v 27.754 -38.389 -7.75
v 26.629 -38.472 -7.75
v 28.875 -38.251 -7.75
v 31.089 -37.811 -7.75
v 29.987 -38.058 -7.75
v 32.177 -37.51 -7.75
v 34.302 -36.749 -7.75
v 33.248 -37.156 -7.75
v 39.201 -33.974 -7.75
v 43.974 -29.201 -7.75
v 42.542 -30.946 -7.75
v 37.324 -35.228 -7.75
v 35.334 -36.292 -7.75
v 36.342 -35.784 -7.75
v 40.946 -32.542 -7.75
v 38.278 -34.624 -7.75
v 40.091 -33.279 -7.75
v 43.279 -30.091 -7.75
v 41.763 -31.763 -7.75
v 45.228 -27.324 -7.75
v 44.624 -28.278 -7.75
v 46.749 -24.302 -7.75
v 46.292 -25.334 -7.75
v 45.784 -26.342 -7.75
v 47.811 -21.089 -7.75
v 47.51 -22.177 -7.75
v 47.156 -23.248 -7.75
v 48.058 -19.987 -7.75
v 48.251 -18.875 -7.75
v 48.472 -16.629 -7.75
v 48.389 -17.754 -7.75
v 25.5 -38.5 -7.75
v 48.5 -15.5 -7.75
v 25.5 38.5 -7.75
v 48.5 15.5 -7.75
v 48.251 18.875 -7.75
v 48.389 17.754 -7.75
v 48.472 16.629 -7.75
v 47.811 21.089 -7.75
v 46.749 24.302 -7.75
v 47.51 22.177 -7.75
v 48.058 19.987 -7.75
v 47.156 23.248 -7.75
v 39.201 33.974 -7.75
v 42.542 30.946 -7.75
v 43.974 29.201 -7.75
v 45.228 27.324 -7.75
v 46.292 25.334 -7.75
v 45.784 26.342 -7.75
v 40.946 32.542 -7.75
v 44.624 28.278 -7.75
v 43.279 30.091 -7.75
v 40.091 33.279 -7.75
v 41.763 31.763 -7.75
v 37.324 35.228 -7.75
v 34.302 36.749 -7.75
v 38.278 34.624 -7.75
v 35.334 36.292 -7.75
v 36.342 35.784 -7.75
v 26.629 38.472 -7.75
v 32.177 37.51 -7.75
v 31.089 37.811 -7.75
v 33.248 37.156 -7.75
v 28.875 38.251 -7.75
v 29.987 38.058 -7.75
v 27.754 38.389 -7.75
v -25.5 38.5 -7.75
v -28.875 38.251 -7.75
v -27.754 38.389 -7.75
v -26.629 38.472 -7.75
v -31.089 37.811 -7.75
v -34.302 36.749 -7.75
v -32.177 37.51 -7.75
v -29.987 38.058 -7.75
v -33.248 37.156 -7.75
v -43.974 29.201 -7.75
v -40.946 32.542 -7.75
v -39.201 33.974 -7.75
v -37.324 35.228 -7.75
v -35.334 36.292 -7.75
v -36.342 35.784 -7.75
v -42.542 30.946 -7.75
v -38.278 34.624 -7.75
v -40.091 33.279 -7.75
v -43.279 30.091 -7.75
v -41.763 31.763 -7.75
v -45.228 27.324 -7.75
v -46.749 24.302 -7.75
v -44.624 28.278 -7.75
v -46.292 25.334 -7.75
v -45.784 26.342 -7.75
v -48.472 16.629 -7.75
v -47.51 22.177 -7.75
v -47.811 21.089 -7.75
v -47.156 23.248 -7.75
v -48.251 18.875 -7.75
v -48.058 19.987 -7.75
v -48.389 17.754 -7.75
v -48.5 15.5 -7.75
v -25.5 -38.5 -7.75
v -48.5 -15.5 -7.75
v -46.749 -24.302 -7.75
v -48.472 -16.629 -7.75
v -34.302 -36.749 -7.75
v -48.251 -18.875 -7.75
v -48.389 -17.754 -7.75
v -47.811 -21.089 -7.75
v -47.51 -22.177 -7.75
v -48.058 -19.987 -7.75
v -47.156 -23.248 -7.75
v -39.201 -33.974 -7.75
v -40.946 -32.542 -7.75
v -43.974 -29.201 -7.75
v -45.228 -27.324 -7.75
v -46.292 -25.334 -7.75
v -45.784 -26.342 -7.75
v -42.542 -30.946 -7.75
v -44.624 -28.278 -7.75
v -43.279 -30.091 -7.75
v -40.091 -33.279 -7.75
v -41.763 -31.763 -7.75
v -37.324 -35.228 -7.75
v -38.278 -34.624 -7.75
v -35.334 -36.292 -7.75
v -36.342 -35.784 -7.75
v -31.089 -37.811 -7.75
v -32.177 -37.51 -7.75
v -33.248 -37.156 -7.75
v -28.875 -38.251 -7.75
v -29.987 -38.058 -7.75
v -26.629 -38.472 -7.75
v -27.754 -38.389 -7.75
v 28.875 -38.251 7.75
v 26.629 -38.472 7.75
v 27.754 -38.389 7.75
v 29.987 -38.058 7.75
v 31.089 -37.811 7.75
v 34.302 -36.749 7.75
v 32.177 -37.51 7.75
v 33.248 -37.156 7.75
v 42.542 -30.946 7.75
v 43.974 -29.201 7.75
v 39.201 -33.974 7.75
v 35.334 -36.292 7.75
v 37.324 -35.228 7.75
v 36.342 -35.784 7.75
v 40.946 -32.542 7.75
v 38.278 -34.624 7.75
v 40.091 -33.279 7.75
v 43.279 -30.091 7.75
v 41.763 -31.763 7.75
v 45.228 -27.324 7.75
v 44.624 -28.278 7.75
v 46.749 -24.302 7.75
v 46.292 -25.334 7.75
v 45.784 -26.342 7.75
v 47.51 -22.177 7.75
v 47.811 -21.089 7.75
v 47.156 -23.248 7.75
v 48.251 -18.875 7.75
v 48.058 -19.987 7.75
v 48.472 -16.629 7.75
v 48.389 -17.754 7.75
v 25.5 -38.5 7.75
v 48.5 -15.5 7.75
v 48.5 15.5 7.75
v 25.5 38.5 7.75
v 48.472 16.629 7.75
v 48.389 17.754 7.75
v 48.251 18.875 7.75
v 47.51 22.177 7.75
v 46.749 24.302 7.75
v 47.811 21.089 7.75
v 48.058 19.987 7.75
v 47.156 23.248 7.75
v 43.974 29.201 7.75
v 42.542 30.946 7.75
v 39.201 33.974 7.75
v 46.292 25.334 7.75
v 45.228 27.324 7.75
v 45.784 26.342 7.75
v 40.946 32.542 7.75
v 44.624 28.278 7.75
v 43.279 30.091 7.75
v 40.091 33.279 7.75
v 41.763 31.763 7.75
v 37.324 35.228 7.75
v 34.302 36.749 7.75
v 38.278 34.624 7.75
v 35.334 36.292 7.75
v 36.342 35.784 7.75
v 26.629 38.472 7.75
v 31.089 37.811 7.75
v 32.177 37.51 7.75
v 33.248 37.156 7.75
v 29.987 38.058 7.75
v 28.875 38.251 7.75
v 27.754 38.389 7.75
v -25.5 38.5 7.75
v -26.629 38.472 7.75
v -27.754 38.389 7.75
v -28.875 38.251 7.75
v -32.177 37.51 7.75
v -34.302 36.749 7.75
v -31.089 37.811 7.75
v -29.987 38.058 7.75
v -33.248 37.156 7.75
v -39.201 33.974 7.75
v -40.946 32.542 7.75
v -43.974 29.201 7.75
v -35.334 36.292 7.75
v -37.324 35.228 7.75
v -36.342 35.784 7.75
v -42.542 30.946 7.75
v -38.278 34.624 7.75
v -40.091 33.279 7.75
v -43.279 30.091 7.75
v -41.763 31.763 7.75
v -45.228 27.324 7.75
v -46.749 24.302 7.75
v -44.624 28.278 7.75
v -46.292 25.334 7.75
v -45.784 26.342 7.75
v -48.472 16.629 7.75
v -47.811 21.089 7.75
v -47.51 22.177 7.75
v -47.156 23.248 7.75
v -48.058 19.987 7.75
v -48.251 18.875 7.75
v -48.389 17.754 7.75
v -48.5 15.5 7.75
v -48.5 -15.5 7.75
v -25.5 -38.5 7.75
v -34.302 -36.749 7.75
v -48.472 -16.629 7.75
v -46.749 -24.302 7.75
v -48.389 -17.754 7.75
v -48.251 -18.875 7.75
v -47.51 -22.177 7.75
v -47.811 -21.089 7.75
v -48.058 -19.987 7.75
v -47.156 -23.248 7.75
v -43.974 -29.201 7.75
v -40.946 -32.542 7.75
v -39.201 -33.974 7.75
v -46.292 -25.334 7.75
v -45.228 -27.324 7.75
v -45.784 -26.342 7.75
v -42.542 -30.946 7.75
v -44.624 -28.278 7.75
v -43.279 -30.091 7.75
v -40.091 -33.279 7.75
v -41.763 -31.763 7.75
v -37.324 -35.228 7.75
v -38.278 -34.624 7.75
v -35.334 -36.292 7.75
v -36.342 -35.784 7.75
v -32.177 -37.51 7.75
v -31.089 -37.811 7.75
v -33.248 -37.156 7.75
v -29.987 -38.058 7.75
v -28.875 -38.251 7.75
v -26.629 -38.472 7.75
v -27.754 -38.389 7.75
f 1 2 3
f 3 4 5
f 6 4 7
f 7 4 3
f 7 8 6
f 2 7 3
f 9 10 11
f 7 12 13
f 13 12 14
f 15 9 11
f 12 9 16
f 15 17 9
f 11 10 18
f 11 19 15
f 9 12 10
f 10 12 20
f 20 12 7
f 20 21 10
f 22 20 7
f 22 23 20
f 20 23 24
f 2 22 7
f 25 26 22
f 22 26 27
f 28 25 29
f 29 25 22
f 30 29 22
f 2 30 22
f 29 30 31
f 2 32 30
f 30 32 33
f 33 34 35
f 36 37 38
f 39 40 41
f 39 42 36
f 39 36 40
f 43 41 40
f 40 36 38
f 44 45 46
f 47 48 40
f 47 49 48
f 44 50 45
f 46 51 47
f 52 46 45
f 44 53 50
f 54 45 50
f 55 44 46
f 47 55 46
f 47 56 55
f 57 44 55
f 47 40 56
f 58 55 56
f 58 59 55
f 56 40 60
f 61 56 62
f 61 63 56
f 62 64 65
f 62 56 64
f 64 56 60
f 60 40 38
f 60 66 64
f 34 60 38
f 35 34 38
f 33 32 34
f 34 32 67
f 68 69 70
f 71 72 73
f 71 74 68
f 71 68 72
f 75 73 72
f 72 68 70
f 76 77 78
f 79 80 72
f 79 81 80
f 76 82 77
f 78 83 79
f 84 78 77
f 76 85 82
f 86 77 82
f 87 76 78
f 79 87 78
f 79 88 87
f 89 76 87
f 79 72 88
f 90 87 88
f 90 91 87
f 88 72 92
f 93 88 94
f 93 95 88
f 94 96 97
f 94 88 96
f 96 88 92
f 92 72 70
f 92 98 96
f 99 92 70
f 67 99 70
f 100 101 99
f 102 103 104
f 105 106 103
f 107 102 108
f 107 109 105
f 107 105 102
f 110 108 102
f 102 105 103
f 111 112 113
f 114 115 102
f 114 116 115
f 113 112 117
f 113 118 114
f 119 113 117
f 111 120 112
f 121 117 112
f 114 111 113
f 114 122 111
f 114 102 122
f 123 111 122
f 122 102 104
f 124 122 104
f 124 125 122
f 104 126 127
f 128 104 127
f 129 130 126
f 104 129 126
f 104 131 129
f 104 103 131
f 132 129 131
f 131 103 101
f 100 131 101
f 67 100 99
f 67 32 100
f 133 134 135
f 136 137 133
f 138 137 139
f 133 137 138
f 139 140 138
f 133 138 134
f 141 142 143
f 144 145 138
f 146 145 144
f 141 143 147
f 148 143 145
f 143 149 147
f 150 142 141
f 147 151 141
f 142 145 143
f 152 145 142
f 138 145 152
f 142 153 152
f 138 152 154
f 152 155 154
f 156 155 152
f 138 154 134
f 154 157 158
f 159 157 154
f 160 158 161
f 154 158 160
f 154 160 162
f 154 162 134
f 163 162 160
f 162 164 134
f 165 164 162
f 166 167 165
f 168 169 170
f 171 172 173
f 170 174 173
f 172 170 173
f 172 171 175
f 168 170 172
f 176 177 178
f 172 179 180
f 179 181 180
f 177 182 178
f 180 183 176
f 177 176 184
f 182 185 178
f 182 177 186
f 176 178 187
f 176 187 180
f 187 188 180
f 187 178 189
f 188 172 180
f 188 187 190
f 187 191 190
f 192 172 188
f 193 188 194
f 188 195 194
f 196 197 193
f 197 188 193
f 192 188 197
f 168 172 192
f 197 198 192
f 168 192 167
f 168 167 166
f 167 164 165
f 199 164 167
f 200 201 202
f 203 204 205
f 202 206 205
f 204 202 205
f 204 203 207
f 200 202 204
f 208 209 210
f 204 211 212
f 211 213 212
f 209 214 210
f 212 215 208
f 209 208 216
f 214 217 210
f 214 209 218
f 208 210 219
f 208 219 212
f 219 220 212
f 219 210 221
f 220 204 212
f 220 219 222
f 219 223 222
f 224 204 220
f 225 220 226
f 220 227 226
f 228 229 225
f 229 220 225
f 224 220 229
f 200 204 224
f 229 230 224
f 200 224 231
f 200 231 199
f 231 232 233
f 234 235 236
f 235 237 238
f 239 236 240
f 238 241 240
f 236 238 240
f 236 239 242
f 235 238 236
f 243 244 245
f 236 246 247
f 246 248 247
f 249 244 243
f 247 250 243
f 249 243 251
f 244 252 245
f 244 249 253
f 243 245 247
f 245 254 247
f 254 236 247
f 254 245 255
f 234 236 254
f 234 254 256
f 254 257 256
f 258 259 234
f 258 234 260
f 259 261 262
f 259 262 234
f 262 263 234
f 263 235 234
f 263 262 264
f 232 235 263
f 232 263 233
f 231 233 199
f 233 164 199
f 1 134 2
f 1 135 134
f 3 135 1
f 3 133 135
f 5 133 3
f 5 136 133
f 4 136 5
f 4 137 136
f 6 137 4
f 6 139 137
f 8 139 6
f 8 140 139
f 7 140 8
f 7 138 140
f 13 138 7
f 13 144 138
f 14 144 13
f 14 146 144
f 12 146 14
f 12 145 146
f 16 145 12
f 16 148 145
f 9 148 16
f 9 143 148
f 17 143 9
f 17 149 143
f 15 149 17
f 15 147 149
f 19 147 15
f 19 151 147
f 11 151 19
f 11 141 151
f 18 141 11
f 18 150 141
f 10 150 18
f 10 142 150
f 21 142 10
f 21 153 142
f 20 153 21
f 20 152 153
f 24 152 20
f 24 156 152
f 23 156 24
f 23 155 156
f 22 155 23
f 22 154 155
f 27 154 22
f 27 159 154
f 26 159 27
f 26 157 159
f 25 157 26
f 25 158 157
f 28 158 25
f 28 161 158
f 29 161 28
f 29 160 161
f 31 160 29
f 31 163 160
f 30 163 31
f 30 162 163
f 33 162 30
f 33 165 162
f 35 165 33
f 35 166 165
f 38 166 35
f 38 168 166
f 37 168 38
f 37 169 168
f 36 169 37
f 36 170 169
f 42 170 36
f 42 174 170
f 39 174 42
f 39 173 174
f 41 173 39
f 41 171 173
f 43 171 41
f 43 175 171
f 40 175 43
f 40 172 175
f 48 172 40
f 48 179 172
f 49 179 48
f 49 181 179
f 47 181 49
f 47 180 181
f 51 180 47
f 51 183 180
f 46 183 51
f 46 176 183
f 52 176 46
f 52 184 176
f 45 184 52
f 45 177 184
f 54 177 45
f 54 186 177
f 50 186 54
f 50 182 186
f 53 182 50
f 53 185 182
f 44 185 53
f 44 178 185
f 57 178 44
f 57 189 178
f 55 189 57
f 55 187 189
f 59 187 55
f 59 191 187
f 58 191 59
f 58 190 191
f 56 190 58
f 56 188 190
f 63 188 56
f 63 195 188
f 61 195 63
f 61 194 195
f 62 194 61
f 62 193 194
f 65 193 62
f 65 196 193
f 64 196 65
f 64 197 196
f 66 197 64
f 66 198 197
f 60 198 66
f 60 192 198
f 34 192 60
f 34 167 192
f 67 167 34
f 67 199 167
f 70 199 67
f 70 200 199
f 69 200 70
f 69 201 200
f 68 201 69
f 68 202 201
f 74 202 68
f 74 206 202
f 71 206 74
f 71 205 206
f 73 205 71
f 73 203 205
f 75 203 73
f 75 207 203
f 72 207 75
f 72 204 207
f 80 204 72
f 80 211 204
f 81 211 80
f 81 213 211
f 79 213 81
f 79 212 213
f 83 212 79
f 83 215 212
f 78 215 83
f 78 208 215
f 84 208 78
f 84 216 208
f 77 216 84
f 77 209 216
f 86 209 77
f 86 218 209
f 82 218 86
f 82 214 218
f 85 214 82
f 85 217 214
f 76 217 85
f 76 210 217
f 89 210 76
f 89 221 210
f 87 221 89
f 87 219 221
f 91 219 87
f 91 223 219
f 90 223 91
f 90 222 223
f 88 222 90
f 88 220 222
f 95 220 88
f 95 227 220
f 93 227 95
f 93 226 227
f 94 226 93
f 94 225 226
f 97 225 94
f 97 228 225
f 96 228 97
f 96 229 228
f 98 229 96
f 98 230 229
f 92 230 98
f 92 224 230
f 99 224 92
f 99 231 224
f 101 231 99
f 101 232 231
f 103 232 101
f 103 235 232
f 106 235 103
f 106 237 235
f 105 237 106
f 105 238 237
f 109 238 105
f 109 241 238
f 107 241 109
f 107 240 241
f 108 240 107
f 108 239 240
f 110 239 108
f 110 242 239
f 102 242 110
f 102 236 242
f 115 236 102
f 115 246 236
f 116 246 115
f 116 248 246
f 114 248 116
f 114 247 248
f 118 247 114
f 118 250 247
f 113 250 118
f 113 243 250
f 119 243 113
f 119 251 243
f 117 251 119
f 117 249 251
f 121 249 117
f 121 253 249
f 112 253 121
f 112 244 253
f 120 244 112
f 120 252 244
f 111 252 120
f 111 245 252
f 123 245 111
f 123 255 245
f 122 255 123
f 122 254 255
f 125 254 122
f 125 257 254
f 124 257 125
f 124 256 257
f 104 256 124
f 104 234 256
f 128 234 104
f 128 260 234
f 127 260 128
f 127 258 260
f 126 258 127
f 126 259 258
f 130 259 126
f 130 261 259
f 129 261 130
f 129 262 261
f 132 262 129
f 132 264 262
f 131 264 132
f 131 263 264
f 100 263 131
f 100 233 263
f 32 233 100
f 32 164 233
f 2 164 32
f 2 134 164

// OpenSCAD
// ============================================================
// 奥克斯(AUX)饮水机杯垫 —— 内圈实体版 (独立文件)
// 尺寸 = 环形版内腔尺寸: 97 x 77 x 15.5 mm, 四角圆角 R = 23
// 顶/底保持平面; 可选 45° 倒角 (默认 0)
// 尺寸来源: 外圈 101x81 R25 - 壁厚 2mm -> 97x77 R23
// ============================================================

$fn = 128;

W = 97;         // 长 (X) = 101 - 2*壁厚
D = 77;         // 宽 (Y) = 81  - 2*壁厚
H = 15.5;       // 高 (Z)
R = 23;         // 圆角半径 = 25 - 壁厚

CHAMFER = 0;    // 顶/底棱边倒角尺寸 (0 = 不倒角)
E = 0.02;       // 微小过切, 避免共面

// ------------------------------------------------------------
// 带圆角的矩形截面
// ------------------------------------------------------------
module profile() {
    offset(r = R) offset(r = -R)
        square([W, D], center = true);
}

// 主体: 截面沿 Z 拉伸 -> 竖边带 R23 圆角, 顶/底是平面
module body() {
    linear_extrude(height = H, center = true)
        profile();
}

// ------------------------------------------------------------
// 外沿 45° 倒角楔块 (axis: "X"/"Y" 截面所在侧面; sign: ±1; top: 顶/底)
// 斜边严格通过 (i, 顶面) 与 (f, 顶面-CHAMFER), 保证 45°;
// E 只加在楔块外侧延伸角上, 不改变斜边角度。
// ------------------------------------------------------------
module wedge(axis, sign, top) {
    if (axis == "Y") {
        f = sign * D/2;                          // 侧面位置
        i = f - sign * CHAMFER;                  // 顶面内缩点
        rotate([0, 90, 0])                       // 截面在 YZ 平面, 沿 X 拉伸
            linear_extrude(W + 4 * CHAMFER, center = true)
                polygon(top ? [
                    [-H/2,           i],
                    [-H/2 + CHAMFER, f],
                    [-H/2 - E,       f],
                    [-H/2 - E,       i]
                ] : [
                    [ H/2,           i],
                    [ H/2 - CHAMFER, f],
                    [ H/2 + E,       f],
                    [ H/2 + E,       i]
                ]);
    } else {
        f = sign * W/2;
        i = f - sign * CHAMFER;
        rotate([90, 0, 0])                       // 截面在 XZ 平面, 沿 Y 拉伸
            linear_extrude(D + 4 * CHAMFER, center = true)
                polygon(top ? [
                    [i,  H/2],
                    [f,  H/2 - CHAMFER],
                    [f,  H/2 + E],
                    [i,  H/2 + E]
                ] : [
                    [i, -H/2],
                    [f, -H/2 + CHAMFER],
                    [f, -H/2 - E],
                    [i, -H/2 - E]
                ]);
    }
}

// 成品: 主体减去四边顶部 + 四边底部的倒角楔块
module part() {
    if (CHAMFER <= 0) {
        body();
    } else {
        difference() {
            body();
            for (s = [1, -1]) {
                for (top = [true, false]) {
                    wedge("Y", s, top);
                    wedge("X", s, top);
                }
            }
        }
    }
}

part();
